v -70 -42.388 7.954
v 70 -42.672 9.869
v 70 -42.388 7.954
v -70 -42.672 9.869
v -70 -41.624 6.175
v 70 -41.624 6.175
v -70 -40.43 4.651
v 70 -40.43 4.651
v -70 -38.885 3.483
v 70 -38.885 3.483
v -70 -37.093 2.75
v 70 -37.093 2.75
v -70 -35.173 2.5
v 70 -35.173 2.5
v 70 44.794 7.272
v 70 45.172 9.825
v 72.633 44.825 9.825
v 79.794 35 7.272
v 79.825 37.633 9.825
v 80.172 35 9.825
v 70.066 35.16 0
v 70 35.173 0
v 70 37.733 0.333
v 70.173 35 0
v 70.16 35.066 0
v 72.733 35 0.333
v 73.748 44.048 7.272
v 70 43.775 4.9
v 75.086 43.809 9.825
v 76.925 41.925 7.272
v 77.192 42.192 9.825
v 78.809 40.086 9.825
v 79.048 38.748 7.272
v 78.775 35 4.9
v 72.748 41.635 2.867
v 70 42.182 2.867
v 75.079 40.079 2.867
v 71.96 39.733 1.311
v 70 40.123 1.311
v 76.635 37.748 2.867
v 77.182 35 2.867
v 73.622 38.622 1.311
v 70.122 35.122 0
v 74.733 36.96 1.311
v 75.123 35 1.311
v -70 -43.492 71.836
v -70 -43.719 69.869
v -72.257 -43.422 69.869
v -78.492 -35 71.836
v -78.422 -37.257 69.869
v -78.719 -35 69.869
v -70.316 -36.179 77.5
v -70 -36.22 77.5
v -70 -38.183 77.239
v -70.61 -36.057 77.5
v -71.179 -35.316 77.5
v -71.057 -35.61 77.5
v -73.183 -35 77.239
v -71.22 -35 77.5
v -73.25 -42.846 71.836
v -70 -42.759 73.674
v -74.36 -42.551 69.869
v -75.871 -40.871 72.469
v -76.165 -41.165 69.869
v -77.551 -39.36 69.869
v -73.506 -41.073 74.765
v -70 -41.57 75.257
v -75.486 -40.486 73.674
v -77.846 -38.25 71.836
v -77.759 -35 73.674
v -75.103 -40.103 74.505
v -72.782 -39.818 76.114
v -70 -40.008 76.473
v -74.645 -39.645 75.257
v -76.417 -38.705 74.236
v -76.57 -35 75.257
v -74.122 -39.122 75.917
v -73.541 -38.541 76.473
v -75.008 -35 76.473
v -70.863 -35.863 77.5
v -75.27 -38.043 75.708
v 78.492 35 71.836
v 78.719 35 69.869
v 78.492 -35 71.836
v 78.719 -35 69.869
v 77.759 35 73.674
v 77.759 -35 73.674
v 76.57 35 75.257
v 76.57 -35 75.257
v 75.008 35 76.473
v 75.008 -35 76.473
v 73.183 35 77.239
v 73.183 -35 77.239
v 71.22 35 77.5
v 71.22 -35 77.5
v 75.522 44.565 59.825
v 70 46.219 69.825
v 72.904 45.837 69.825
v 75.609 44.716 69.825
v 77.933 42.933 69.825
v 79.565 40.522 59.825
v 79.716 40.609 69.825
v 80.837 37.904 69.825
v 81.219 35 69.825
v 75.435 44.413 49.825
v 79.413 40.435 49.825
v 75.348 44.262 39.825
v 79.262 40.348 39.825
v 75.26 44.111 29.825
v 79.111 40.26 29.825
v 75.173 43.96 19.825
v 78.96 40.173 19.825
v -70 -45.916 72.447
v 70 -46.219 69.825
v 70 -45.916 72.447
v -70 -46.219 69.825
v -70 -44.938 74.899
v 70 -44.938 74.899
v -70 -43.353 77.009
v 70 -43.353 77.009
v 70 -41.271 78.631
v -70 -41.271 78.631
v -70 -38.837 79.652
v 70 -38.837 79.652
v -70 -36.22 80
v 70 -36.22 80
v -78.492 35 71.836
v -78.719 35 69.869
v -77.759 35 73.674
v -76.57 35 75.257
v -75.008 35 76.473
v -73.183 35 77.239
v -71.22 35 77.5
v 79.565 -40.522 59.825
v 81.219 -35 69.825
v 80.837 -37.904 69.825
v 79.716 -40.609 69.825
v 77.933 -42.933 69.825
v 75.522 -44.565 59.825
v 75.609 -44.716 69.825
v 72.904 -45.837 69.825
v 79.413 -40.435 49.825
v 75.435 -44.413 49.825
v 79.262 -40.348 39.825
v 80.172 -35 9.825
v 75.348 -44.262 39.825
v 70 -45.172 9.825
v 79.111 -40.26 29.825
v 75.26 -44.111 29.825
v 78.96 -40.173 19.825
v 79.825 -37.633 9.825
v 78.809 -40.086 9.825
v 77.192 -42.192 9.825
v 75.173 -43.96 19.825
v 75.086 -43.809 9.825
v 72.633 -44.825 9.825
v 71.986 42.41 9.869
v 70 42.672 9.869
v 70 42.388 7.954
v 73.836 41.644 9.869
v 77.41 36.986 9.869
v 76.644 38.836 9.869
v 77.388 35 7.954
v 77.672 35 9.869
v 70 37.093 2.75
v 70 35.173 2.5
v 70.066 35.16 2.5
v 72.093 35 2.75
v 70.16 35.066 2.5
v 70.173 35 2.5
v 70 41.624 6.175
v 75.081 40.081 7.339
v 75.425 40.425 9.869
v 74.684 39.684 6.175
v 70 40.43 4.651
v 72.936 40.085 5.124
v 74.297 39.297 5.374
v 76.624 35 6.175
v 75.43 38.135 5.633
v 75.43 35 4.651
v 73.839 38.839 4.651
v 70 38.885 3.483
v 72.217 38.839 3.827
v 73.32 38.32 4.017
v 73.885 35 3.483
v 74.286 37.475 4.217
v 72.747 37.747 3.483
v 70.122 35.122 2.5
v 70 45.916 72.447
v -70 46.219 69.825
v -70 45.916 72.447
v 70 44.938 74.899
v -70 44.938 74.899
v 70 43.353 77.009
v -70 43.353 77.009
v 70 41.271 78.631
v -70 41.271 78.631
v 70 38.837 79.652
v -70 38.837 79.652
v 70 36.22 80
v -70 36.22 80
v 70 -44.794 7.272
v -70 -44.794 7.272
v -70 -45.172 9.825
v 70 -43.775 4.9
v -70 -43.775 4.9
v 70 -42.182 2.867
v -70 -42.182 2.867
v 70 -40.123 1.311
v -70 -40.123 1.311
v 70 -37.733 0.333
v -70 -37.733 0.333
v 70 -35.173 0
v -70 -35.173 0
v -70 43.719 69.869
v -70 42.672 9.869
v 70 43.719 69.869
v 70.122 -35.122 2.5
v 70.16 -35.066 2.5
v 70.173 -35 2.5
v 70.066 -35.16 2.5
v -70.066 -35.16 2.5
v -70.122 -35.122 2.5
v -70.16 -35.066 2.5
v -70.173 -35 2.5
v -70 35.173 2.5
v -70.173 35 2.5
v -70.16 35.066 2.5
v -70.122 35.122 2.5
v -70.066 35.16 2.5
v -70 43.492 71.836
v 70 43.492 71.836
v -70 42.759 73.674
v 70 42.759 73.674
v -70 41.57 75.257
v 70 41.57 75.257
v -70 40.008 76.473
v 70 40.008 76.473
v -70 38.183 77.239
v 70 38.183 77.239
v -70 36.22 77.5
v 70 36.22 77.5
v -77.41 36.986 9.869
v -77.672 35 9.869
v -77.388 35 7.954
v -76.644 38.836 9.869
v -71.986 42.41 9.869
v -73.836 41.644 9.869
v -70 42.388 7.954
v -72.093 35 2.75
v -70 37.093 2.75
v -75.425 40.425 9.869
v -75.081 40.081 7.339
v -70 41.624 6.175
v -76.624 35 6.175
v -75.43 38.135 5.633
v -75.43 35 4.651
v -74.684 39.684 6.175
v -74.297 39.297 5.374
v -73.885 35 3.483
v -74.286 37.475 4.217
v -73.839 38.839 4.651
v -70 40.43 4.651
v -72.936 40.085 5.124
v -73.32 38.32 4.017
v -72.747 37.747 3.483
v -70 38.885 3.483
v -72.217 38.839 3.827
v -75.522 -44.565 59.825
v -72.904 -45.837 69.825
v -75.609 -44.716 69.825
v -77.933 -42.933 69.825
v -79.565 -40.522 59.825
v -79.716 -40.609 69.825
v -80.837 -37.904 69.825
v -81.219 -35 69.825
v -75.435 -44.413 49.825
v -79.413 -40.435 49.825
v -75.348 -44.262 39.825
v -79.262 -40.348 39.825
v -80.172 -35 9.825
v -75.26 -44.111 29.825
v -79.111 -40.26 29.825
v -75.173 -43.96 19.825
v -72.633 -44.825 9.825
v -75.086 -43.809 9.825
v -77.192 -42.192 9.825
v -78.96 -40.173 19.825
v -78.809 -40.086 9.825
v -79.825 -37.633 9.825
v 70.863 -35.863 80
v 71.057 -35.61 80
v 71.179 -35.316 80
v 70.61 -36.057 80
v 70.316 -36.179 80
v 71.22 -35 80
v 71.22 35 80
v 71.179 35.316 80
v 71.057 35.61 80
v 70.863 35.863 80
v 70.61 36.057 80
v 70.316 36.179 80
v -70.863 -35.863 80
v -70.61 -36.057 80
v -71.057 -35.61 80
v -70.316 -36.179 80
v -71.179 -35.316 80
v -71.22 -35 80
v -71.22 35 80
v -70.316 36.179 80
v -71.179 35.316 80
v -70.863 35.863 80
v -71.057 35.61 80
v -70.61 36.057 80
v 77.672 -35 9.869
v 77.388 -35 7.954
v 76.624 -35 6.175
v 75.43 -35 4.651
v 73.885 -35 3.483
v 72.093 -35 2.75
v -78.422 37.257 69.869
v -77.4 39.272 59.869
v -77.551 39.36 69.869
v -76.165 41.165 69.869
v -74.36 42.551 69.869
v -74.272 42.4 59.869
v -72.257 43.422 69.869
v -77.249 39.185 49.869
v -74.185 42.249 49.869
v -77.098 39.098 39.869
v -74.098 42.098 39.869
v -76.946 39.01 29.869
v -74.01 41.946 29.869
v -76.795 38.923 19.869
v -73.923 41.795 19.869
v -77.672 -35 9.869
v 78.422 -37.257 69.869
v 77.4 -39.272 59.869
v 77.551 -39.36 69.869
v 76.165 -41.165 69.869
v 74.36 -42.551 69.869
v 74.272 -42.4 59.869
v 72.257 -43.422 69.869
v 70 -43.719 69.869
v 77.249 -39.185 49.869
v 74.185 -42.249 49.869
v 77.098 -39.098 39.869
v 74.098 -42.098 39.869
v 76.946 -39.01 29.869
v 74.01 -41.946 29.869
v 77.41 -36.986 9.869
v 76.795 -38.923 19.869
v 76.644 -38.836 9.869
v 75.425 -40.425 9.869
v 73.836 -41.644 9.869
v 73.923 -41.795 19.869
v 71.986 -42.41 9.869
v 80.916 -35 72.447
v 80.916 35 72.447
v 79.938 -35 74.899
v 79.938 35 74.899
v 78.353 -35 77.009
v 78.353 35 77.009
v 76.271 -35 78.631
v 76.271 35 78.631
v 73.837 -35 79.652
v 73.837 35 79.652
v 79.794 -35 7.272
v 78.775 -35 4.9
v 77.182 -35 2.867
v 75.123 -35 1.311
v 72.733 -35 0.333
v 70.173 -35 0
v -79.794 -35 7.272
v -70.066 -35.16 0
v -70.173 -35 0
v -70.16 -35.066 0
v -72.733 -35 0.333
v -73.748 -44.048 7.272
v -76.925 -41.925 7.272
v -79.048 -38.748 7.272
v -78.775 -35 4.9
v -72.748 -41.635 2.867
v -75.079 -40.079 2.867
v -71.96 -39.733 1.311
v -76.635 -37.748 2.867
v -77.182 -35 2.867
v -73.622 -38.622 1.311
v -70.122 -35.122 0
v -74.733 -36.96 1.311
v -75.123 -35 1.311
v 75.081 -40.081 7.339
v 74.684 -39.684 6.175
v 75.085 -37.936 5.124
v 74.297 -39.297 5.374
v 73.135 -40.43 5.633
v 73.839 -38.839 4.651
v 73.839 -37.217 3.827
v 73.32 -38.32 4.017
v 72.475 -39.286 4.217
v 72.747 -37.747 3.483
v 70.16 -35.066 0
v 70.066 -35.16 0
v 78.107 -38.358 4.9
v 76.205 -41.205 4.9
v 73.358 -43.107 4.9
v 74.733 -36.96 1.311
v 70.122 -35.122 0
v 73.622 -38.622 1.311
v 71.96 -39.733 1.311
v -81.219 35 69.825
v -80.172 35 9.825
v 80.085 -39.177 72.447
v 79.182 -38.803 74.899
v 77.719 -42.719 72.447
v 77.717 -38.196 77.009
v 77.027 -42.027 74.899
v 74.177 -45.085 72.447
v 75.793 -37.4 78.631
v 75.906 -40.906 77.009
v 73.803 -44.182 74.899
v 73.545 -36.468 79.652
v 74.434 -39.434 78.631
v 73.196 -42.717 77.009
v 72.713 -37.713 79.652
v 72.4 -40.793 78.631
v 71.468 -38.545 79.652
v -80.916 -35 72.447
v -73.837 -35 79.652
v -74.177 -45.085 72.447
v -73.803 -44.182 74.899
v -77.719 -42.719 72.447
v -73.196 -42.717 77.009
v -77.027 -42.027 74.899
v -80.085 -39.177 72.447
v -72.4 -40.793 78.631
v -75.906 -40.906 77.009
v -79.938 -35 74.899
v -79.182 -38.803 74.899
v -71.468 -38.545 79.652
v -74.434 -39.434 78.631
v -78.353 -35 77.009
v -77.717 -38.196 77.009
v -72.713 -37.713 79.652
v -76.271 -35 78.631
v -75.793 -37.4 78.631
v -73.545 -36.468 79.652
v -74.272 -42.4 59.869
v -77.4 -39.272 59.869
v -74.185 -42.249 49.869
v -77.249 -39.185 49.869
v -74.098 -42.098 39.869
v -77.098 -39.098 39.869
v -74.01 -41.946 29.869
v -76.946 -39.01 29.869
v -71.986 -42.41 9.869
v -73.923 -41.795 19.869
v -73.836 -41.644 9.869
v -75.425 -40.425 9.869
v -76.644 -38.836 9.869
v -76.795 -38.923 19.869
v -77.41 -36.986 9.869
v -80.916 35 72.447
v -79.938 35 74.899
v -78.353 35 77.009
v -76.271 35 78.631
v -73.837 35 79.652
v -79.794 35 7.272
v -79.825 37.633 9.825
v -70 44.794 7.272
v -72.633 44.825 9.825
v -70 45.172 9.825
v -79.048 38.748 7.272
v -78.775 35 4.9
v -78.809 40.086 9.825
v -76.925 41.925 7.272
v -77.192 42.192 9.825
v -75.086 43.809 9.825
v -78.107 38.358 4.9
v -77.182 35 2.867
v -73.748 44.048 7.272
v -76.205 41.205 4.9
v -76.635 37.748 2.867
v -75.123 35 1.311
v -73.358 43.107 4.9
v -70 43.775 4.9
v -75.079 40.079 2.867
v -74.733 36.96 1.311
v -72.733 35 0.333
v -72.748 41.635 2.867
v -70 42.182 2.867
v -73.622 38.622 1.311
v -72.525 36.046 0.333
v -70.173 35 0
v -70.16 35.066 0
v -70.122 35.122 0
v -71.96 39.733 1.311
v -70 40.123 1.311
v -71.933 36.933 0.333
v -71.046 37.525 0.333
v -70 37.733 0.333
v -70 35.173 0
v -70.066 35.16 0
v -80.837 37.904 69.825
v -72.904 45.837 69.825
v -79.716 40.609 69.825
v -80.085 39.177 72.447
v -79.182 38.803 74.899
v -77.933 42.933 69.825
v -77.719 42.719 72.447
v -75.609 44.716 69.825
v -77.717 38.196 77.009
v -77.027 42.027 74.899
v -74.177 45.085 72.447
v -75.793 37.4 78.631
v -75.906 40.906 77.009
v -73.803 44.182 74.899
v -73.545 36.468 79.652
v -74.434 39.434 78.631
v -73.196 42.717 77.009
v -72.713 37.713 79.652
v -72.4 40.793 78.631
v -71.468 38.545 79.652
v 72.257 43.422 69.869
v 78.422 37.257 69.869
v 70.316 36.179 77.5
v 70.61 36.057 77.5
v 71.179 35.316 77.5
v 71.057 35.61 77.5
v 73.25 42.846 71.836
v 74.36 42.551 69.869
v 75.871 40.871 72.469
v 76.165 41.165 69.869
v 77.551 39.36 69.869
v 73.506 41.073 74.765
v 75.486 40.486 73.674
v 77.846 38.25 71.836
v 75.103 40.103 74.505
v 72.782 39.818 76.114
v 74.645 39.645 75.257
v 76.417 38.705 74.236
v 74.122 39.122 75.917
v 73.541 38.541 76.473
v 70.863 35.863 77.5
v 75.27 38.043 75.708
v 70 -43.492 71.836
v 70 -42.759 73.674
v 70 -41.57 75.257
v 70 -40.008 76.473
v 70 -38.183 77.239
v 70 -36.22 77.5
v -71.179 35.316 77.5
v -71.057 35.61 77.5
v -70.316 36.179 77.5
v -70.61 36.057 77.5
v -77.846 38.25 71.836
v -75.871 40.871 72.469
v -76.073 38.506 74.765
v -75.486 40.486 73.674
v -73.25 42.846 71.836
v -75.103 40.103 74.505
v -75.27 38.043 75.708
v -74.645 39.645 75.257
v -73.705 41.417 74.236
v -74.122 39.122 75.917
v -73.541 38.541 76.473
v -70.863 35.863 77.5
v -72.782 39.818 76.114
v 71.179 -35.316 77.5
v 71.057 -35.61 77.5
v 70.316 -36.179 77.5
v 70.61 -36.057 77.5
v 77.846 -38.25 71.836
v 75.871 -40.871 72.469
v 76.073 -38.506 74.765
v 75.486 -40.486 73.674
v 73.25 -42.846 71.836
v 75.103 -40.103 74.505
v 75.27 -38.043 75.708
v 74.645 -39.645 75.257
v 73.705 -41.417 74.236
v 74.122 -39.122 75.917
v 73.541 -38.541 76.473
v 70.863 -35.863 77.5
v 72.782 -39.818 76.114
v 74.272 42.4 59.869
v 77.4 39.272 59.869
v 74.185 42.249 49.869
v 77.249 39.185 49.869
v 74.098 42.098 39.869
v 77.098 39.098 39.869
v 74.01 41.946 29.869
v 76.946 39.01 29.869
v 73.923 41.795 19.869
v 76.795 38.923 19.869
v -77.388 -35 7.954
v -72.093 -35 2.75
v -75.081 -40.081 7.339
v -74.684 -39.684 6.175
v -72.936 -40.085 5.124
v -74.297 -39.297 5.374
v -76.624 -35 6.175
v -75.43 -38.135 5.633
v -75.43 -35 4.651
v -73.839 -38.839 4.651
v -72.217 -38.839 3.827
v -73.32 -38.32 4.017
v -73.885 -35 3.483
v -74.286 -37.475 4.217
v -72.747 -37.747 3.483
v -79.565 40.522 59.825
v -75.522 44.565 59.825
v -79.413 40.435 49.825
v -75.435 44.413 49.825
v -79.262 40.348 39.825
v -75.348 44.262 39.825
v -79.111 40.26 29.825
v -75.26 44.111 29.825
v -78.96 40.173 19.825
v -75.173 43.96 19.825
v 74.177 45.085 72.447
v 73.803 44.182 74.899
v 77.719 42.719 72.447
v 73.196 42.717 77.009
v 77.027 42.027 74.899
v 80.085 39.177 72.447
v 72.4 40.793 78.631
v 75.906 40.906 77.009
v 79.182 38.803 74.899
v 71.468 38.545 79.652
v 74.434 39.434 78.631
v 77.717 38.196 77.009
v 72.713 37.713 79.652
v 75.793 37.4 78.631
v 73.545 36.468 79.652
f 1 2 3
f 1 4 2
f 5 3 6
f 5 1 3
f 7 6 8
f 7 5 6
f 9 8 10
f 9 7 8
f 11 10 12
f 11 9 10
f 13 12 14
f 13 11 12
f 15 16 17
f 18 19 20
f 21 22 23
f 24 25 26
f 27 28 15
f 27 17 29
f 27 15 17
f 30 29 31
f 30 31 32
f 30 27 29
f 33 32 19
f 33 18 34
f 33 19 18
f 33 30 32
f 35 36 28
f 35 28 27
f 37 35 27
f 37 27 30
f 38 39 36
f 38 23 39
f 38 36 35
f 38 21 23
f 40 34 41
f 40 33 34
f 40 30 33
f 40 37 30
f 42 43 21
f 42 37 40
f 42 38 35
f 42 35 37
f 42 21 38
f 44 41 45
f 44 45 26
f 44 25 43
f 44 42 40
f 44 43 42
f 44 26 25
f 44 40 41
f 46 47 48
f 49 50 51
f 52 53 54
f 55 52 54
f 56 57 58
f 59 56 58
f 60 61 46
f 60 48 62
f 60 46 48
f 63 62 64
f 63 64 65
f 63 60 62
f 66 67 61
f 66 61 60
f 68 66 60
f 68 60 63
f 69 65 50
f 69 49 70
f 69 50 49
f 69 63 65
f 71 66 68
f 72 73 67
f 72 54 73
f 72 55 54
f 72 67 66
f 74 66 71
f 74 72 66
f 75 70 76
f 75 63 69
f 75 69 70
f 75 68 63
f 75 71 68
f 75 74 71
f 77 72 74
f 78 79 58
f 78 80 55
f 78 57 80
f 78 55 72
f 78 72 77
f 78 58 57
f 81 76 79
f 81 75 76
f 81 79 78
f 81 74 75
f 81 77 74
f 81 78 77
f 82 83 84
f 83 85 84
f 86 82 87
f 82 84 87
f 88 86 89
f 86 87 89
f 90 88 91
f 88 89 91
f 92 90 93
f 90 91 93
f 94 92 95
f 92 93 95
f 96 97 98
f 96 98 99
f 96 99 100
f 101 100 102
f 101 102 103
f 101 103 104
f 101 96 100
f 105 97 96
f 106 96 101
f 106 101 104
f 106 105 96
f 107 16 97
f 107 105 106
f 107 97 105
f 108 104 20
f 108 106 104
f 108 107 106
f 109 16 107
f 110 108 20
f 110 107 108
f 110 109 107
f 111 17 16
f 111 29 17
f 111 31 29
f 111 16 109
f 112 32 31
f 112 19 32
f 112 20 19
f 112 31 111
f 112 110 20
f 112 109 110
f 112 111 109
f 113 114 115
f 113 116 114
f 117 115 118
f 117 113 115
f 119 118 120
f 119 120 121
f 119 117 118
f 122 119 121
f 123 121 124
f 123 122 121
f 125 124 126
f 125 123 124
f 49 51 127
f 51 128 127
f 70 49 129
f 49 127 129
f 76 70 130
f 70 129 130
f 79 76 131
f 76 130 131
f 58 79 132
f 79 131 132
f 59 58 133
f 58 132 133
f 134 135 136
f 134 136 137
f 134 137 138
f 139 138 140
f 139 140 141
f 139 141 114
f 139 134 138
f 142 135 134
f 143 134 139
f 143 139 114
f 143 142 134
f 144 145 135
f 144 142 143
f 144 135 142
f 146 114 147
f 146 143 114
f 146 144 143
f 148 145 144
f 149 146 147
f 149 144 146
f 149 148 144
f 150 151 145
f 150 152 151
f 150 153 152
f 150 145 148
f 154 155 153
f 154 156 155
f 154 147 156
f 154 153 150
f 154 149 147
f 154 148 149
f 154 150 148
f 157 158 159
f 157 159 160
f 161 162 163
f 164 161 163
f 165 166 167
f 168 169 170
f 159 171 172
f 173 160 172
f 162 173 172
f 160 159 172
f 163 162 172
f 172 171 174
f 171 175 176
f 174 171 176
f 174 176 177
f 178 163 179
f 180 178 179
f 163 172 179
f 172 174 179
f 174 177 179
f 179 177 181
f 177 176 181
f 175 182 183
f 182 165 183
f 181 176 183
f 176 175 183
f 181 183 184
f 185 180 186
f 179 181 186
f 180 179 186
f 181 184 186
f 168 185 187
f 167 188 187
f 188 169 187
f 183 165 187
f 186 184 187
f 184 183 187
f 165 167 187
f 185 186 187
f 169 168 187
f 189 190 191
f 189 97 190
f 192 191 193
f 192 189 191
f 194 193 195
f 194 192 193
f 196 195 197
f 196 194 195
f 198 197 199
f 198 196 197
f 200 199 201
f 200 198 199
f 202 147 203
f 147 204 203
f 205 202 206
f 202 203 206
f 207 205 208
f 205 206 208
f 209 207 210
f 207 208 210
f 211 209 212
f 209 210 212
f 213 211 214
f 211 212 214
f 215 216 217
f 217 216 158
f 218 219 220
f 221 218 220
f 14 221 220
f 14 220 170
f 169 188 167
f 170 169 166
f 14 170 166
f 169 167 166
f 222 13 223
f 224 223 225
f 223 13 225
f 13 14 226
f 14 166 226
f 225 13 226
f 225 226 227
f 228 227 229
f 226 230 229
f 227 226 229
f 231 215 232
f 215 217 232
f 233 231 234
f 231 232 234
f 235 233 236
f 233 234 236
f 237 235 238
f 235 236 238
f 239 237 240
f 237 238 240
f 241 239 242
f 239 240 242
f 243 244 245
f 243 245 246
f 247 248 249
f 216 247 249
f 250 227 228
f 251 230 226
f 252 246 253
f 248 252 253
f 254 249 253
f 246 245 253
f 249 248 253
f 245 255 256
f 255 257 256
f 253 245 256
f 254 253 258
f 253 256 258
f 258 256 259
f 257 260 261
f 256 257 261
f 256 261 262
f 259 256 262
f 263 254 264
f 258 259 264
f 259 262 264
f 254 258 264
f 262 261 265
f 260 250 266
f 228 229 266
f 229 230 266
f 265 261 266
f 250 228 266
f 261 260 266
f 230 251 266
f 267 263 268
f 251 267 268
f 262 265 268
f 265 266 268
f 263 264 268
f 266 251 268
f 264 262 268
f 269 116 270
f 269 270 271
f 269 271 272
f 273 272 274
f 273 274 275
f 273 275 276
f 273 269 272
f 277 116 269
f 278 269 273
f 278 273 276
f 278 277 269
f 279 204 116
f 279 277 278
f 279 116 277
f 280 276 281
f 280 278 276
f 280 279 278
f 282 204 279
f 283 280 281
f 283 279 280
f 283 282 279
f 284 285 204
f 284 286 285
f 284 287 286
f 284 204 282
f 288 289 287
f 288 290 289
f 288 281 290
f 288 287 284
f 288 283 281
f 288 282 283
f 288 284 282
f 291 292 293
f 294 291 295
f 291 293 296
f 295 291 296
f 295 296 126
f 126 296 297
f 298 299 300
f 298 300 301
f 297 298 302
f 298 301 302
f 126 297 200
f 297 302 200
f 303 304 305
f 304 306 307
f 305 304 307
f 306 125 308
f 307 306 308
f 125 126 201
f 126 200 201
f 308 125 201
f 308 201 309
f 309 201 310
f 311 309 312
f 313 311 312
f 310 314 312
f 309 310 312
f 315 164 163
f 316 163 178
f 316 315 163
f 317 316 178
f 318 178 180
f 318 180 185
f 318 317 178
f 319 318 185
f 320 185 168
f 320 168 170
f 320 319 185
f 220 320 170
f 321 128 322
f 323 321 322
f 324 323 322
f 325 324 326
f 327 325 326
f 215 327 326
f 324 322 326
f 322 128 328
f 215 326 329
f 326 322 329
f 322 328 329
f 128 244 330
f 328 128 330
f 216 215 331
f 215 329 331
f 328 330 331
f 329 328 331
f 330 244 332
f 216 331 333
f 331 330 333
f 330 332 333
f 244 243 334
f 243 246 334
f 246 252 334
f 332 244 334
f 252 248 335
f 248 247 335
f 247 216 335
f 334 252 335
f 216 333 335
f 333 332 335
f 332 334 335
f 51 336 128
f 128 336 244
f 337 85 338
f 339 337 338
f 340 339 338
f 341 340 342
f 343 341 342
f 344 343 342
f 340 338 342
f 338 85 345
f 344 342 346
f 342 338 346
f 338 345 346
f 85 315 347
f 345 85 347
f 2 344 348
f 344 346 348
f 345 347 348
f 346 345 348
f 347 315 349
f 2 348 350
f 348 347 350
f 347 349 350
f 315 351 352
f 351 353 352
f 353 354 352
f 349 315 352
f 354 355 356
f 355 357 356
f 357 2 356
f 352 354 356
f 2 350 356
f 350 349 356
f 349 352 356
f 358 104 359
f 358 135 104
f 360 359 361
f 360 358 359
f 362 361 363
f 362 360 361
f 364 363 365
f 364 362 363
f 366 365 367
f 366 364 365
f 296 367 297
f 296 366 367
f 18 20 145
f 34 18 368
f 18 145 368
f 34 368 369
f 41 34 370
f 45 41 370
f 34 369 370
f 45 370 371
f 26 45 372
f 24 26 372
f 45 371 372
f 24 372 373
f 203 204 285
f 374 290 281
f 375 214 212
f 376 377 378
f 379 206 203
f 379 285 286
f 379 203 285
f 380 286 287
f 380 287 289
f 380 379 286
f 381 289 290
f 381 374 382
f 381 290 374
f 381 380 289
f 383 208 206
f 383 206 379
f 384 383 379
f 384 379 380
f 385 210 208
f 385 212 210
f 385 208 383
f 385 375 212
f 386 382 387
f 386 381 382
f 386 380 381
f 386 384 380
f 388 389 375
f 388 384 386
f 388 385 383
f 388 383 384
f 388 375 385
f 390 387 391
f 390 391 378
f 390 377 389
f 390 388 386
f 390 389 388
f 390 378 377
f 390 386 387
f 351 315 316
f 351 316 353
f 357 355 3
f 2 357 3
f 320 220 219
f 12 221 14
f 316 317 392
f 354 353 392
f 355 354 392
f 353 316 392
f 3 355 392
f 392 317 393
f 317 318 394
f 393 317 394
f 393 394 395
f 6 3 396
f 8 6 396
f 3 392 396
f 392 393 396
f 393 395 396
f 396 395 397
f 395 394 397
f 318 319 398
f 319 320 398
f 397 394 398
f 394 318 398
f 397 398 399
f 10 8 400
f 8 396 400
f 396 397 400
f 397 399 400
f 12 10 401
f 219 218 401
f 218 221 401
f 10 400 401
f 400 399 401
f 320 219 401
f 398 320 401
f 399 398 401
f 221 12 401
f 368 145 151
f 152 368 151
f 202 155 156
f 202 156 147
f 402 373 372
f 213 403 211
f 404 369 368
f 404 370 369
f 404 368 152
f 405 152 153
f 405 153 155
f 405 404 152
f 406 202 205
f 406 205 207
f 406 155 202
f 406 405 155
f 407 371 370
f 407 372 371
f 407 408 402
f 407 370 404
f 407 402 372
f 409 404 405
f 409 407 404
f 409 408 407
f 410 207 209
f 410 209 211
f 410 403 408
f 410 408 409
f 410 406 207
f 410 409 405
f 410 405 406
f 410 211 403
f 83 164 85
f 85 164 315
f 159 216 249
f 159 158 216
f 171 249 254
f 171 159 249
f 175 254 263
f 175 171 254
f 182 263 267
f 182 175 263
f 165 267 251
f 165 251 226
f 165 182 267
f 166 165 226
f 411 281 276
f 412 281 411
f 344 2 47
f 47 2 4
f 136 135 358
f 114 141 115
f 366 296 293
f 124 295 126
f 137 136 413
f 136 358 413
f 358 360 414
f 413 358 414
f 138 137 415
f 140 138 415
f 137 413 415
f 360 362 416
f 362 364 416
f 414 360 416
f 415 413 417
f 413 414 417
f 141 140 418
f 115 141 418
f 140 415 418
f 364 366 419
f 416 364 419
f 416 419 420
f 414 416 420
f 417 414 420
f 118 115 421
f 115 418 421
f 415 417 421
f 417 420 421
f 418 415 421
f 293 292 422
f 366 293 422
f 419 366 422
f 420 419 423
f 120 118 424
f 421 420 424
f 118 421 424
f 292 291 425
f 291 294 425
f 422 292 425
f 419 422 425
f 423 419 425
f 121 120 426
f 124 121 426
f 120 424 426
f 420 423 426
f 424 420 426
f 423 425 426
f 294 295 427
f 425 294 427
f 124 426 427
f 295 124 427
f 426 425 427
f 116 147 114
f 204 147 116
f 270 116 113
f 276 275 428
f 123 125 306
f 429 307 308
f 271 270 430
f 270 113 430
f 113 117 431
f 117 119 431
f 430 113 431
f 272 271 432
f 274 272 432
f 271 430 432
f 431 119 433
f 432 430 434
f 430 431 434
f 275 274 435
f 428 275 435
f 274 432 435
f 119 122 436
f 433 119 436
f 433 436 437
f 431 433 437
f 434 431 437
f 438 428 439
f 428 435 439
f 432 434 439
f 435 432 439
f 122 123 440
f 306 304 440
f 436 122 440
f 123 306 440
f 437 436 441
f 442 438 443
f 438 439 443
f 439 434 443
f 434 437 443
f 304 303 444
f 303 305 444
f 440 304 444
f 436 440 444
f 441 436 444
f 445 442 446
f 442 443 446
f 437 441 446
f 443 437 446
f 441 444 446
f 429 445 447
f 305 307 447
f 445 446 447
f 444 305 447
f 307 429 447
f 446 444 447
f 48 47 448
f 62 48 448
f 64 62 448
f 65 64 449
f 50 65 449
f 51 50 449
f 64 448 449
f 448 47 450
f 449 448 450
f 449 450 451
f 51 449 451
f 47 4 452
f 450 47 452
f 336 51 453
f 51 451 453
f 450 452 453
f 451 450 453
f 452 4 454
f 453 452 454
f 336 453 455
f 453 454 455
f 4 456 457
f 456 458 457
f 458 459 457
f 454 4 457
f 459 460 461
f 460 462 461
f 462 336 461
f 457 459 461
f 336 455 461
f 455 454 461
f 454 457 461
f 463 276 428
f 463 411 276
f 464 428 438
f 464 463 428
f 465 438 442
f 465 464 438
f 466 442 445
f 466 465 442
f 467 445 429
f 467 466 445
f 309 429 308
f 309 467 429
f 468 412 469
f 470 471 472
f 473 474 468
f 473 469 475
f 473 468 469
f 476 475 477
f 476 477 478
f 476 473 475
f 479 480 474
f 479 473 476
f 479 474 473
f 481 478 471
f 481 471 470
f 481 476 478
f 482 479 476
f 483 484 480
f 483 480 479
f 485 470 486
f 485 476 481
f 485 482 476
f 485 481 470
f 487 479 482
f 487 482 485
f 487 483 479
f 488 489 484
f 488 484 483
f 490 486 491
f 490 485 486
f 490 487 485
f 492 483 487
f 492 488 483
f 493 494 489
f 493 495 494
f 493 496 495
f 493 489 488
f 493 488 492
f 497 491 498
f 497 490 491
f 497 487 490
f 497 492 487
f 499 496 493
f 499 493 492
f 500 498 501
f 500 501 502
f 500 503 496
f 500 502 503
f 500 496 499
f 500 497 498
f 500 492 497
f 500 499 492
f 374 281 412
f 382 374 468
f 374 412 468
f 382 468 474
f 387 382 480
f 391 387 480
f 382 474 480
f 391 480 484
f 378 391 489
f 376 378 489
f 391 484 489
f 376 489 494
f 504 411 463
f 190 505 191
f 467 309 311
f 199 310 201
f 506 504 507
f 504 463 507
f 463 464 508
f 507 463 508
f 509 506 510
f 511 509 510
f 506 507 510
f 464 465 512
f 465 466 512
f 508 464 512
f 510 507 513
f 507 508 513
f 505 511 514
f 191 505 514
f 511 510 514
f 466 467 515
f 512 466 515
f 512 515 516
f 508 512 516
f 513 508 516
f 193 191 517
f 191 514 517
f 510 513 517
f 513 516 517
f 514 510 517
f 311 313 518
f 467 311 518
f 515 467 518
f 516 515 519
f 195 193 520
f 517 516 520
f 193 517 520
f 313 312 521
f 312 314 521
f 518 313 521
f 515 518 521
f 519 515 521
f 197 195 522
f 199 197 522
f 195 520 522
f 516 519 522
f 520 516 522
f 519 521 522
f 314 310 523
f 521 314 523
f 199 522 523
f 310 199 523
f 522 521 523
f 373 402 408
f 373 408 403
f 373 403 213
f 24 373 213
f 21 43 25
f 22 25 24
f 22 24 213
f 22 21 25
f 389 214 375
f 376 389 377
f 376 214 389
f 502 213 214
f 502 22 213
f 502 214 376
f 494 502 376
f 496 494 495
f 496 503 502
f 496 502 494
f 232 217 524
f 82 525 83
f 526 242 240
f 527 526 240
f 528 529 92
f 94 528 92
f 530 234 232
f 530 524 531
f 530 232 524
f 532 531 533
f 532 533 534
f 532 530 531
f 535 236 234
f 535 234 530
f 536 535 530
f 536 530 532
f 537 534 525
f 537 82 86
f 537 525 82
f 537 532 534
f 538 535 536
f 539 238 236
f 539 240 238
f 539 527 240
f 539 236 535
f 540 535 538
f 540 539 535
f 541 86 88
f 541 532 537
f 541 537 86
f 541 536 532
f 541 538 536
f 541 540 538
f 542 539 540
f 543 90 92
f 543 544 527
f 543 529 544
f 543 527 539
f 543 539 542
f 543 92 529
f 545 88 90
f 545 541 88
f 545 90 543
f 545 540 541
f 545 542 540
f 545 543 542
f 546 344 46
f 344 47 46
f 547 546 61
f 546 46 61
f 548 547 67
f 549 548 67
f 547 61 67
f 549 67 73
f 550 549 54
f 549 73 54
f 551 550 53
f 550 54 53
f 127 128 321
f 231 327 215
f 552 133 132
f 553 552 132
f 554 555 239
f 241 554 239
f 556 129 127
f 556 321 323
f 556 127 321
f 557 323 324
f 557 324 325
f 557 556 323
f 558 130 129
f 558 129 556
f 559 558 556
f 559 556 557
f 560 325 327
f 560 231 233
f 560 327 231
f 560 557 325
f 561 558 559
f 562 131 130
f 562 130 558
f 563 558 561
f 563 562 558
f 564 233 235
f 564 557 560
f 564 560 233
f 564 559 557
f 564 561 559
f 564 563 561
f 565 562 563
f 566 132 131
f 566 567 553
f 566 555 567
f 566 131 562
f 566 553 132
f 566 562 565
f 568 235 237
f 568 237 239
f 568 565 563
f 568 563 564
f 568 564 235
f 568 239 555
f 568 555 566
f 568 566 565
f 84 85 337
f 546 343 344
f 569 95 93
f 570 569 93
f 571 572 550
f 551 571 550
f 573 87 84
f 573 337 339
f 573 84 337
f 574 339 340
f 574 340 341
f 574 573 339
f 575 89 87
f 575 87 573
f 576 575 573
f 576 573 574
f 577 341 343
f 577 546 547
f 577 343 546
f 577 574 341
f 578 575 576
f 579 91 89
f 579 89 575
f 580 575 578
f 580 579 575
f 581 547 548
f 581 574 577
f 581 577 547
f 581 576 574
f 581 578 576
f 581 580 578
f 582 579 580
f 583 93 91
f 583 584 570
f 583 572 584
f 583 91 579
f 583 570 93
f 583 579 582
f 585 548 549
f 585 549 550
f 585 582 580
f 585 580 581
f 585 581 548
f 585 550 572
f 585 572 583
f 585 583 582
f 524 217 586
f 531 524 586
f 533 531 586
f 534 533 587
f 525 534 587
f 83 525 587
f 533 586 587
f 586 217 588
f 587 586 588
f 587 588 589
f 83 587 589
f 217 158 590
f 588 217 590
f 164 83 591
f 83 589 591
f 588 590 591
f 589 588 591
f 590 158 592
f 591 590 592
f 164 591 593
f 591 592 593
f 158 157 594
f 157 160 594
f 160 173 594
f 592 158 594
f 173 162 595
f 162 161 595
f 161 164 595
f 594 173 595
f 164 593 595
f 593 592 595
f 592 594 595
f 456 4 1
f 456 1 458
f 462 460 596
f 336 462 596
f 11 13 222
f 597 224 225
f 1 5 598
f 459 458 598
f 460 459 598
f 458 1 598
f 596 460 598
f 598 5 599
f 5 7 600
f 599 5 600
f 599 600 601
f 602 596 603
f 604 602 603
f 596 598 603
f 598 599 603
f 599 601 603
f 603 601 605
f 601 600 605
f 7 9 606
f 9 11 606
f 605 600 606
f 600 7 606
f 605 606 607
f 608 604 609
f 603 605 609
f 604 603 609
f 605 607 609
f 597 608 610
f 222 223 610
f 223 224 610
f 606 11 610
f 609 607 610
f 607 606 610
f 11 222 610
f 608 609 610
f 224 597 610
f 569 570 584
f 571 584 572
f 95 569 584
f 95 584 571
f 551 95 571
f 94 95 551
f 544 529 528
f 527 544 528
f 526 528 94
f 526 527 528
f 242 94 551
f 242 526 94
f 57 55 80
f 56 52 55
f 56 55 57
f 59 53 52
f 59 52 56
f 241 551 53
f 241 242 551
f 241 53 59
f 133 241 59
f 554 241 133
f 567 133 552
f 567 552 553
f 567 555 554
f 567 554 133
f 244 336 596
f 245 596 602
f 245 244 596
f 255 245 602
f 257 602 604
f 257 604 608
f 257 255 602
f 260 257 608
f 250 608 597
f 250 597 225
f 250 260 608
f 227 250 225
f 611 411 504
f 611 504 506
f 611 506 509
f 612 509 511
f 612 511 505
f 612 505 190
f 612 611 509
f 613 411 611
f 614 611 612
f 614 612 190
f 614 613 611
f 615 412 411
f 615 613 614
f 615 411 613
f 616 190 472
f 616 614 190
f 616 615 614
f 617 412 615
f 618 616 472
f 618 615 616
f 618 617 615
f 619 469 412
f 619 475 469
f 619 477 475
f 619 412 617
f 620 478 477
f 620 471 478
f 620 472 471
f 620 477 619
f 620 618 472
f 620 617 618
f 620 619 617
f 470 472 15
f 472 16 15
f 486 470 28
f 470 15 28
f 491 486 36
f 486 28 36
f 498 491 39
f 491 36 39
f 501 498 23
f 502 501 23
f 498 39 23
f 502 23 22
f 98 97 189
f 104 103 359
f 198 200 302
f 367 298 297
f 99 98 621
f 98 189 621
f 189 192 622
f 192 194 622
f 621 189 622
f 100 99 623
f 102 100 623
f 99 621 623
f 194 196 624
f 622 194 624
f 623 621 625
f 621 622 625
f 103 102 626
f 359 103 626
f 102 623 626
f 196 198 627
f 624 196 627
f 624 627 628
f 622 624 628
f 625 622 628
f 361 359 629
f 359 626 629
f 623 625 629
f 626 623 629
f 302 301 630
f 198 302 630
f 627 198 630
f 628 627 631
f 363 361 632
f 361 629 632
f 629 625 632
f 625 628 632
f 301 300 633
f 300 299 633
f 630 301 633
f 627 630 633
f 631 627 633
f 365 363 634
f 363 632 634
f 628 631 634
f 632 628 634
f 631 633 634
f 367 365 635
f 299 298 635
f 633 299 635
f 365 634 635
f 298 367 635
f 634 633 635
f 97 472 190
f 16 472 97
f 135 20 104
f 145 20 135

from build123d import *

# Parameters (mm, degrees)
BOSS_EXTRUDE1_DEPTH = 80
DRAFT1_ANGLE        = 1
FILLET1_R           = 10
SHELL2_T            = 2.5


with BuildPart() as part:
    # Sketch1 → Boss-Extrude1 (new body)
    with BuildSketch(Plane.XY):
        with BuildLine():
            Line((-70, 45), (70, 45))
            ThreePointArc((70, 45), (77.071067812, 42.071067812), (80, 35))
            Line((80, 35), (80, -35))
            ThreePointArc((80, -35), (77.071067812, -42.071067812), (70, -45))
            Line((70, -45), (-70, -45))
            ThreePointArc((-70, -45), (-77.071067812, -42.071067812), (-80, -35))
            Line((-80, -35), (-80, 35))
            ThreePointArc((-80, 35), (-77.071067812, 42.071067812), (-70, 45))
        make_face()
    extrude(amount=BOSS_EXTRUDE1_DEPTH)

    # Draft1
    draft1_faces = [part.faces().sort_by_distance(p)[0] for p in [
        (-77.071067812, -42.071067812, 40),
        (-77.071067812, 42.071067812, 40),
        (77.071067812, 42.071067812, 40),
        (77.071067812, -42.071067812, 40),
        (80, 0, 40),
        (0, -45, 40),
        (-80, 0, 40),
        (0, 45, 40),
    ]]
    draft(draft1_faces, Plane(origin=(-70, 35, 0), x_dir=(-1, 0, 0), z_dir=(0, 0, -1)), DRAFT1_ANGLE)

    # Fillet1
    fillet1_edges = [part.edges().sort_by_distance(p)[0] for p in [
        (0, -45, 0),
        (-77.071067812, -42.071067812, 0),
        (-80, 0, 0),
        (-77.071067812, 42.071067812, 0),
        (-78.058475394, -43.058475394, 80),
        (0, -46.396405194, 80),
        (78.058475394, -43.058475394, 80),
        (81.396405194, 0, 80),
        (78.058475394, 43.058475394, 80),
        (0, 46.396405194, 80),
        (-78.058475394, 43.058475394, 80),
        (0, 45, 0),
        (-81.396405194, 0, 80),
        (77.071067812, 42.071067812, 0),
        (80, 0, 0),
        (77.071067812, -42.071067812, 0),
    ]]
    fillet(fillet1_edges, radius=FILLET1_R)

    # Shell2 (no face opened: a closed hollow body)
    add(offset(amount=-SHELL2_T, mode=Mode.PRIVATE), mode=Mode.SUBTRACT)


solid = part.part
